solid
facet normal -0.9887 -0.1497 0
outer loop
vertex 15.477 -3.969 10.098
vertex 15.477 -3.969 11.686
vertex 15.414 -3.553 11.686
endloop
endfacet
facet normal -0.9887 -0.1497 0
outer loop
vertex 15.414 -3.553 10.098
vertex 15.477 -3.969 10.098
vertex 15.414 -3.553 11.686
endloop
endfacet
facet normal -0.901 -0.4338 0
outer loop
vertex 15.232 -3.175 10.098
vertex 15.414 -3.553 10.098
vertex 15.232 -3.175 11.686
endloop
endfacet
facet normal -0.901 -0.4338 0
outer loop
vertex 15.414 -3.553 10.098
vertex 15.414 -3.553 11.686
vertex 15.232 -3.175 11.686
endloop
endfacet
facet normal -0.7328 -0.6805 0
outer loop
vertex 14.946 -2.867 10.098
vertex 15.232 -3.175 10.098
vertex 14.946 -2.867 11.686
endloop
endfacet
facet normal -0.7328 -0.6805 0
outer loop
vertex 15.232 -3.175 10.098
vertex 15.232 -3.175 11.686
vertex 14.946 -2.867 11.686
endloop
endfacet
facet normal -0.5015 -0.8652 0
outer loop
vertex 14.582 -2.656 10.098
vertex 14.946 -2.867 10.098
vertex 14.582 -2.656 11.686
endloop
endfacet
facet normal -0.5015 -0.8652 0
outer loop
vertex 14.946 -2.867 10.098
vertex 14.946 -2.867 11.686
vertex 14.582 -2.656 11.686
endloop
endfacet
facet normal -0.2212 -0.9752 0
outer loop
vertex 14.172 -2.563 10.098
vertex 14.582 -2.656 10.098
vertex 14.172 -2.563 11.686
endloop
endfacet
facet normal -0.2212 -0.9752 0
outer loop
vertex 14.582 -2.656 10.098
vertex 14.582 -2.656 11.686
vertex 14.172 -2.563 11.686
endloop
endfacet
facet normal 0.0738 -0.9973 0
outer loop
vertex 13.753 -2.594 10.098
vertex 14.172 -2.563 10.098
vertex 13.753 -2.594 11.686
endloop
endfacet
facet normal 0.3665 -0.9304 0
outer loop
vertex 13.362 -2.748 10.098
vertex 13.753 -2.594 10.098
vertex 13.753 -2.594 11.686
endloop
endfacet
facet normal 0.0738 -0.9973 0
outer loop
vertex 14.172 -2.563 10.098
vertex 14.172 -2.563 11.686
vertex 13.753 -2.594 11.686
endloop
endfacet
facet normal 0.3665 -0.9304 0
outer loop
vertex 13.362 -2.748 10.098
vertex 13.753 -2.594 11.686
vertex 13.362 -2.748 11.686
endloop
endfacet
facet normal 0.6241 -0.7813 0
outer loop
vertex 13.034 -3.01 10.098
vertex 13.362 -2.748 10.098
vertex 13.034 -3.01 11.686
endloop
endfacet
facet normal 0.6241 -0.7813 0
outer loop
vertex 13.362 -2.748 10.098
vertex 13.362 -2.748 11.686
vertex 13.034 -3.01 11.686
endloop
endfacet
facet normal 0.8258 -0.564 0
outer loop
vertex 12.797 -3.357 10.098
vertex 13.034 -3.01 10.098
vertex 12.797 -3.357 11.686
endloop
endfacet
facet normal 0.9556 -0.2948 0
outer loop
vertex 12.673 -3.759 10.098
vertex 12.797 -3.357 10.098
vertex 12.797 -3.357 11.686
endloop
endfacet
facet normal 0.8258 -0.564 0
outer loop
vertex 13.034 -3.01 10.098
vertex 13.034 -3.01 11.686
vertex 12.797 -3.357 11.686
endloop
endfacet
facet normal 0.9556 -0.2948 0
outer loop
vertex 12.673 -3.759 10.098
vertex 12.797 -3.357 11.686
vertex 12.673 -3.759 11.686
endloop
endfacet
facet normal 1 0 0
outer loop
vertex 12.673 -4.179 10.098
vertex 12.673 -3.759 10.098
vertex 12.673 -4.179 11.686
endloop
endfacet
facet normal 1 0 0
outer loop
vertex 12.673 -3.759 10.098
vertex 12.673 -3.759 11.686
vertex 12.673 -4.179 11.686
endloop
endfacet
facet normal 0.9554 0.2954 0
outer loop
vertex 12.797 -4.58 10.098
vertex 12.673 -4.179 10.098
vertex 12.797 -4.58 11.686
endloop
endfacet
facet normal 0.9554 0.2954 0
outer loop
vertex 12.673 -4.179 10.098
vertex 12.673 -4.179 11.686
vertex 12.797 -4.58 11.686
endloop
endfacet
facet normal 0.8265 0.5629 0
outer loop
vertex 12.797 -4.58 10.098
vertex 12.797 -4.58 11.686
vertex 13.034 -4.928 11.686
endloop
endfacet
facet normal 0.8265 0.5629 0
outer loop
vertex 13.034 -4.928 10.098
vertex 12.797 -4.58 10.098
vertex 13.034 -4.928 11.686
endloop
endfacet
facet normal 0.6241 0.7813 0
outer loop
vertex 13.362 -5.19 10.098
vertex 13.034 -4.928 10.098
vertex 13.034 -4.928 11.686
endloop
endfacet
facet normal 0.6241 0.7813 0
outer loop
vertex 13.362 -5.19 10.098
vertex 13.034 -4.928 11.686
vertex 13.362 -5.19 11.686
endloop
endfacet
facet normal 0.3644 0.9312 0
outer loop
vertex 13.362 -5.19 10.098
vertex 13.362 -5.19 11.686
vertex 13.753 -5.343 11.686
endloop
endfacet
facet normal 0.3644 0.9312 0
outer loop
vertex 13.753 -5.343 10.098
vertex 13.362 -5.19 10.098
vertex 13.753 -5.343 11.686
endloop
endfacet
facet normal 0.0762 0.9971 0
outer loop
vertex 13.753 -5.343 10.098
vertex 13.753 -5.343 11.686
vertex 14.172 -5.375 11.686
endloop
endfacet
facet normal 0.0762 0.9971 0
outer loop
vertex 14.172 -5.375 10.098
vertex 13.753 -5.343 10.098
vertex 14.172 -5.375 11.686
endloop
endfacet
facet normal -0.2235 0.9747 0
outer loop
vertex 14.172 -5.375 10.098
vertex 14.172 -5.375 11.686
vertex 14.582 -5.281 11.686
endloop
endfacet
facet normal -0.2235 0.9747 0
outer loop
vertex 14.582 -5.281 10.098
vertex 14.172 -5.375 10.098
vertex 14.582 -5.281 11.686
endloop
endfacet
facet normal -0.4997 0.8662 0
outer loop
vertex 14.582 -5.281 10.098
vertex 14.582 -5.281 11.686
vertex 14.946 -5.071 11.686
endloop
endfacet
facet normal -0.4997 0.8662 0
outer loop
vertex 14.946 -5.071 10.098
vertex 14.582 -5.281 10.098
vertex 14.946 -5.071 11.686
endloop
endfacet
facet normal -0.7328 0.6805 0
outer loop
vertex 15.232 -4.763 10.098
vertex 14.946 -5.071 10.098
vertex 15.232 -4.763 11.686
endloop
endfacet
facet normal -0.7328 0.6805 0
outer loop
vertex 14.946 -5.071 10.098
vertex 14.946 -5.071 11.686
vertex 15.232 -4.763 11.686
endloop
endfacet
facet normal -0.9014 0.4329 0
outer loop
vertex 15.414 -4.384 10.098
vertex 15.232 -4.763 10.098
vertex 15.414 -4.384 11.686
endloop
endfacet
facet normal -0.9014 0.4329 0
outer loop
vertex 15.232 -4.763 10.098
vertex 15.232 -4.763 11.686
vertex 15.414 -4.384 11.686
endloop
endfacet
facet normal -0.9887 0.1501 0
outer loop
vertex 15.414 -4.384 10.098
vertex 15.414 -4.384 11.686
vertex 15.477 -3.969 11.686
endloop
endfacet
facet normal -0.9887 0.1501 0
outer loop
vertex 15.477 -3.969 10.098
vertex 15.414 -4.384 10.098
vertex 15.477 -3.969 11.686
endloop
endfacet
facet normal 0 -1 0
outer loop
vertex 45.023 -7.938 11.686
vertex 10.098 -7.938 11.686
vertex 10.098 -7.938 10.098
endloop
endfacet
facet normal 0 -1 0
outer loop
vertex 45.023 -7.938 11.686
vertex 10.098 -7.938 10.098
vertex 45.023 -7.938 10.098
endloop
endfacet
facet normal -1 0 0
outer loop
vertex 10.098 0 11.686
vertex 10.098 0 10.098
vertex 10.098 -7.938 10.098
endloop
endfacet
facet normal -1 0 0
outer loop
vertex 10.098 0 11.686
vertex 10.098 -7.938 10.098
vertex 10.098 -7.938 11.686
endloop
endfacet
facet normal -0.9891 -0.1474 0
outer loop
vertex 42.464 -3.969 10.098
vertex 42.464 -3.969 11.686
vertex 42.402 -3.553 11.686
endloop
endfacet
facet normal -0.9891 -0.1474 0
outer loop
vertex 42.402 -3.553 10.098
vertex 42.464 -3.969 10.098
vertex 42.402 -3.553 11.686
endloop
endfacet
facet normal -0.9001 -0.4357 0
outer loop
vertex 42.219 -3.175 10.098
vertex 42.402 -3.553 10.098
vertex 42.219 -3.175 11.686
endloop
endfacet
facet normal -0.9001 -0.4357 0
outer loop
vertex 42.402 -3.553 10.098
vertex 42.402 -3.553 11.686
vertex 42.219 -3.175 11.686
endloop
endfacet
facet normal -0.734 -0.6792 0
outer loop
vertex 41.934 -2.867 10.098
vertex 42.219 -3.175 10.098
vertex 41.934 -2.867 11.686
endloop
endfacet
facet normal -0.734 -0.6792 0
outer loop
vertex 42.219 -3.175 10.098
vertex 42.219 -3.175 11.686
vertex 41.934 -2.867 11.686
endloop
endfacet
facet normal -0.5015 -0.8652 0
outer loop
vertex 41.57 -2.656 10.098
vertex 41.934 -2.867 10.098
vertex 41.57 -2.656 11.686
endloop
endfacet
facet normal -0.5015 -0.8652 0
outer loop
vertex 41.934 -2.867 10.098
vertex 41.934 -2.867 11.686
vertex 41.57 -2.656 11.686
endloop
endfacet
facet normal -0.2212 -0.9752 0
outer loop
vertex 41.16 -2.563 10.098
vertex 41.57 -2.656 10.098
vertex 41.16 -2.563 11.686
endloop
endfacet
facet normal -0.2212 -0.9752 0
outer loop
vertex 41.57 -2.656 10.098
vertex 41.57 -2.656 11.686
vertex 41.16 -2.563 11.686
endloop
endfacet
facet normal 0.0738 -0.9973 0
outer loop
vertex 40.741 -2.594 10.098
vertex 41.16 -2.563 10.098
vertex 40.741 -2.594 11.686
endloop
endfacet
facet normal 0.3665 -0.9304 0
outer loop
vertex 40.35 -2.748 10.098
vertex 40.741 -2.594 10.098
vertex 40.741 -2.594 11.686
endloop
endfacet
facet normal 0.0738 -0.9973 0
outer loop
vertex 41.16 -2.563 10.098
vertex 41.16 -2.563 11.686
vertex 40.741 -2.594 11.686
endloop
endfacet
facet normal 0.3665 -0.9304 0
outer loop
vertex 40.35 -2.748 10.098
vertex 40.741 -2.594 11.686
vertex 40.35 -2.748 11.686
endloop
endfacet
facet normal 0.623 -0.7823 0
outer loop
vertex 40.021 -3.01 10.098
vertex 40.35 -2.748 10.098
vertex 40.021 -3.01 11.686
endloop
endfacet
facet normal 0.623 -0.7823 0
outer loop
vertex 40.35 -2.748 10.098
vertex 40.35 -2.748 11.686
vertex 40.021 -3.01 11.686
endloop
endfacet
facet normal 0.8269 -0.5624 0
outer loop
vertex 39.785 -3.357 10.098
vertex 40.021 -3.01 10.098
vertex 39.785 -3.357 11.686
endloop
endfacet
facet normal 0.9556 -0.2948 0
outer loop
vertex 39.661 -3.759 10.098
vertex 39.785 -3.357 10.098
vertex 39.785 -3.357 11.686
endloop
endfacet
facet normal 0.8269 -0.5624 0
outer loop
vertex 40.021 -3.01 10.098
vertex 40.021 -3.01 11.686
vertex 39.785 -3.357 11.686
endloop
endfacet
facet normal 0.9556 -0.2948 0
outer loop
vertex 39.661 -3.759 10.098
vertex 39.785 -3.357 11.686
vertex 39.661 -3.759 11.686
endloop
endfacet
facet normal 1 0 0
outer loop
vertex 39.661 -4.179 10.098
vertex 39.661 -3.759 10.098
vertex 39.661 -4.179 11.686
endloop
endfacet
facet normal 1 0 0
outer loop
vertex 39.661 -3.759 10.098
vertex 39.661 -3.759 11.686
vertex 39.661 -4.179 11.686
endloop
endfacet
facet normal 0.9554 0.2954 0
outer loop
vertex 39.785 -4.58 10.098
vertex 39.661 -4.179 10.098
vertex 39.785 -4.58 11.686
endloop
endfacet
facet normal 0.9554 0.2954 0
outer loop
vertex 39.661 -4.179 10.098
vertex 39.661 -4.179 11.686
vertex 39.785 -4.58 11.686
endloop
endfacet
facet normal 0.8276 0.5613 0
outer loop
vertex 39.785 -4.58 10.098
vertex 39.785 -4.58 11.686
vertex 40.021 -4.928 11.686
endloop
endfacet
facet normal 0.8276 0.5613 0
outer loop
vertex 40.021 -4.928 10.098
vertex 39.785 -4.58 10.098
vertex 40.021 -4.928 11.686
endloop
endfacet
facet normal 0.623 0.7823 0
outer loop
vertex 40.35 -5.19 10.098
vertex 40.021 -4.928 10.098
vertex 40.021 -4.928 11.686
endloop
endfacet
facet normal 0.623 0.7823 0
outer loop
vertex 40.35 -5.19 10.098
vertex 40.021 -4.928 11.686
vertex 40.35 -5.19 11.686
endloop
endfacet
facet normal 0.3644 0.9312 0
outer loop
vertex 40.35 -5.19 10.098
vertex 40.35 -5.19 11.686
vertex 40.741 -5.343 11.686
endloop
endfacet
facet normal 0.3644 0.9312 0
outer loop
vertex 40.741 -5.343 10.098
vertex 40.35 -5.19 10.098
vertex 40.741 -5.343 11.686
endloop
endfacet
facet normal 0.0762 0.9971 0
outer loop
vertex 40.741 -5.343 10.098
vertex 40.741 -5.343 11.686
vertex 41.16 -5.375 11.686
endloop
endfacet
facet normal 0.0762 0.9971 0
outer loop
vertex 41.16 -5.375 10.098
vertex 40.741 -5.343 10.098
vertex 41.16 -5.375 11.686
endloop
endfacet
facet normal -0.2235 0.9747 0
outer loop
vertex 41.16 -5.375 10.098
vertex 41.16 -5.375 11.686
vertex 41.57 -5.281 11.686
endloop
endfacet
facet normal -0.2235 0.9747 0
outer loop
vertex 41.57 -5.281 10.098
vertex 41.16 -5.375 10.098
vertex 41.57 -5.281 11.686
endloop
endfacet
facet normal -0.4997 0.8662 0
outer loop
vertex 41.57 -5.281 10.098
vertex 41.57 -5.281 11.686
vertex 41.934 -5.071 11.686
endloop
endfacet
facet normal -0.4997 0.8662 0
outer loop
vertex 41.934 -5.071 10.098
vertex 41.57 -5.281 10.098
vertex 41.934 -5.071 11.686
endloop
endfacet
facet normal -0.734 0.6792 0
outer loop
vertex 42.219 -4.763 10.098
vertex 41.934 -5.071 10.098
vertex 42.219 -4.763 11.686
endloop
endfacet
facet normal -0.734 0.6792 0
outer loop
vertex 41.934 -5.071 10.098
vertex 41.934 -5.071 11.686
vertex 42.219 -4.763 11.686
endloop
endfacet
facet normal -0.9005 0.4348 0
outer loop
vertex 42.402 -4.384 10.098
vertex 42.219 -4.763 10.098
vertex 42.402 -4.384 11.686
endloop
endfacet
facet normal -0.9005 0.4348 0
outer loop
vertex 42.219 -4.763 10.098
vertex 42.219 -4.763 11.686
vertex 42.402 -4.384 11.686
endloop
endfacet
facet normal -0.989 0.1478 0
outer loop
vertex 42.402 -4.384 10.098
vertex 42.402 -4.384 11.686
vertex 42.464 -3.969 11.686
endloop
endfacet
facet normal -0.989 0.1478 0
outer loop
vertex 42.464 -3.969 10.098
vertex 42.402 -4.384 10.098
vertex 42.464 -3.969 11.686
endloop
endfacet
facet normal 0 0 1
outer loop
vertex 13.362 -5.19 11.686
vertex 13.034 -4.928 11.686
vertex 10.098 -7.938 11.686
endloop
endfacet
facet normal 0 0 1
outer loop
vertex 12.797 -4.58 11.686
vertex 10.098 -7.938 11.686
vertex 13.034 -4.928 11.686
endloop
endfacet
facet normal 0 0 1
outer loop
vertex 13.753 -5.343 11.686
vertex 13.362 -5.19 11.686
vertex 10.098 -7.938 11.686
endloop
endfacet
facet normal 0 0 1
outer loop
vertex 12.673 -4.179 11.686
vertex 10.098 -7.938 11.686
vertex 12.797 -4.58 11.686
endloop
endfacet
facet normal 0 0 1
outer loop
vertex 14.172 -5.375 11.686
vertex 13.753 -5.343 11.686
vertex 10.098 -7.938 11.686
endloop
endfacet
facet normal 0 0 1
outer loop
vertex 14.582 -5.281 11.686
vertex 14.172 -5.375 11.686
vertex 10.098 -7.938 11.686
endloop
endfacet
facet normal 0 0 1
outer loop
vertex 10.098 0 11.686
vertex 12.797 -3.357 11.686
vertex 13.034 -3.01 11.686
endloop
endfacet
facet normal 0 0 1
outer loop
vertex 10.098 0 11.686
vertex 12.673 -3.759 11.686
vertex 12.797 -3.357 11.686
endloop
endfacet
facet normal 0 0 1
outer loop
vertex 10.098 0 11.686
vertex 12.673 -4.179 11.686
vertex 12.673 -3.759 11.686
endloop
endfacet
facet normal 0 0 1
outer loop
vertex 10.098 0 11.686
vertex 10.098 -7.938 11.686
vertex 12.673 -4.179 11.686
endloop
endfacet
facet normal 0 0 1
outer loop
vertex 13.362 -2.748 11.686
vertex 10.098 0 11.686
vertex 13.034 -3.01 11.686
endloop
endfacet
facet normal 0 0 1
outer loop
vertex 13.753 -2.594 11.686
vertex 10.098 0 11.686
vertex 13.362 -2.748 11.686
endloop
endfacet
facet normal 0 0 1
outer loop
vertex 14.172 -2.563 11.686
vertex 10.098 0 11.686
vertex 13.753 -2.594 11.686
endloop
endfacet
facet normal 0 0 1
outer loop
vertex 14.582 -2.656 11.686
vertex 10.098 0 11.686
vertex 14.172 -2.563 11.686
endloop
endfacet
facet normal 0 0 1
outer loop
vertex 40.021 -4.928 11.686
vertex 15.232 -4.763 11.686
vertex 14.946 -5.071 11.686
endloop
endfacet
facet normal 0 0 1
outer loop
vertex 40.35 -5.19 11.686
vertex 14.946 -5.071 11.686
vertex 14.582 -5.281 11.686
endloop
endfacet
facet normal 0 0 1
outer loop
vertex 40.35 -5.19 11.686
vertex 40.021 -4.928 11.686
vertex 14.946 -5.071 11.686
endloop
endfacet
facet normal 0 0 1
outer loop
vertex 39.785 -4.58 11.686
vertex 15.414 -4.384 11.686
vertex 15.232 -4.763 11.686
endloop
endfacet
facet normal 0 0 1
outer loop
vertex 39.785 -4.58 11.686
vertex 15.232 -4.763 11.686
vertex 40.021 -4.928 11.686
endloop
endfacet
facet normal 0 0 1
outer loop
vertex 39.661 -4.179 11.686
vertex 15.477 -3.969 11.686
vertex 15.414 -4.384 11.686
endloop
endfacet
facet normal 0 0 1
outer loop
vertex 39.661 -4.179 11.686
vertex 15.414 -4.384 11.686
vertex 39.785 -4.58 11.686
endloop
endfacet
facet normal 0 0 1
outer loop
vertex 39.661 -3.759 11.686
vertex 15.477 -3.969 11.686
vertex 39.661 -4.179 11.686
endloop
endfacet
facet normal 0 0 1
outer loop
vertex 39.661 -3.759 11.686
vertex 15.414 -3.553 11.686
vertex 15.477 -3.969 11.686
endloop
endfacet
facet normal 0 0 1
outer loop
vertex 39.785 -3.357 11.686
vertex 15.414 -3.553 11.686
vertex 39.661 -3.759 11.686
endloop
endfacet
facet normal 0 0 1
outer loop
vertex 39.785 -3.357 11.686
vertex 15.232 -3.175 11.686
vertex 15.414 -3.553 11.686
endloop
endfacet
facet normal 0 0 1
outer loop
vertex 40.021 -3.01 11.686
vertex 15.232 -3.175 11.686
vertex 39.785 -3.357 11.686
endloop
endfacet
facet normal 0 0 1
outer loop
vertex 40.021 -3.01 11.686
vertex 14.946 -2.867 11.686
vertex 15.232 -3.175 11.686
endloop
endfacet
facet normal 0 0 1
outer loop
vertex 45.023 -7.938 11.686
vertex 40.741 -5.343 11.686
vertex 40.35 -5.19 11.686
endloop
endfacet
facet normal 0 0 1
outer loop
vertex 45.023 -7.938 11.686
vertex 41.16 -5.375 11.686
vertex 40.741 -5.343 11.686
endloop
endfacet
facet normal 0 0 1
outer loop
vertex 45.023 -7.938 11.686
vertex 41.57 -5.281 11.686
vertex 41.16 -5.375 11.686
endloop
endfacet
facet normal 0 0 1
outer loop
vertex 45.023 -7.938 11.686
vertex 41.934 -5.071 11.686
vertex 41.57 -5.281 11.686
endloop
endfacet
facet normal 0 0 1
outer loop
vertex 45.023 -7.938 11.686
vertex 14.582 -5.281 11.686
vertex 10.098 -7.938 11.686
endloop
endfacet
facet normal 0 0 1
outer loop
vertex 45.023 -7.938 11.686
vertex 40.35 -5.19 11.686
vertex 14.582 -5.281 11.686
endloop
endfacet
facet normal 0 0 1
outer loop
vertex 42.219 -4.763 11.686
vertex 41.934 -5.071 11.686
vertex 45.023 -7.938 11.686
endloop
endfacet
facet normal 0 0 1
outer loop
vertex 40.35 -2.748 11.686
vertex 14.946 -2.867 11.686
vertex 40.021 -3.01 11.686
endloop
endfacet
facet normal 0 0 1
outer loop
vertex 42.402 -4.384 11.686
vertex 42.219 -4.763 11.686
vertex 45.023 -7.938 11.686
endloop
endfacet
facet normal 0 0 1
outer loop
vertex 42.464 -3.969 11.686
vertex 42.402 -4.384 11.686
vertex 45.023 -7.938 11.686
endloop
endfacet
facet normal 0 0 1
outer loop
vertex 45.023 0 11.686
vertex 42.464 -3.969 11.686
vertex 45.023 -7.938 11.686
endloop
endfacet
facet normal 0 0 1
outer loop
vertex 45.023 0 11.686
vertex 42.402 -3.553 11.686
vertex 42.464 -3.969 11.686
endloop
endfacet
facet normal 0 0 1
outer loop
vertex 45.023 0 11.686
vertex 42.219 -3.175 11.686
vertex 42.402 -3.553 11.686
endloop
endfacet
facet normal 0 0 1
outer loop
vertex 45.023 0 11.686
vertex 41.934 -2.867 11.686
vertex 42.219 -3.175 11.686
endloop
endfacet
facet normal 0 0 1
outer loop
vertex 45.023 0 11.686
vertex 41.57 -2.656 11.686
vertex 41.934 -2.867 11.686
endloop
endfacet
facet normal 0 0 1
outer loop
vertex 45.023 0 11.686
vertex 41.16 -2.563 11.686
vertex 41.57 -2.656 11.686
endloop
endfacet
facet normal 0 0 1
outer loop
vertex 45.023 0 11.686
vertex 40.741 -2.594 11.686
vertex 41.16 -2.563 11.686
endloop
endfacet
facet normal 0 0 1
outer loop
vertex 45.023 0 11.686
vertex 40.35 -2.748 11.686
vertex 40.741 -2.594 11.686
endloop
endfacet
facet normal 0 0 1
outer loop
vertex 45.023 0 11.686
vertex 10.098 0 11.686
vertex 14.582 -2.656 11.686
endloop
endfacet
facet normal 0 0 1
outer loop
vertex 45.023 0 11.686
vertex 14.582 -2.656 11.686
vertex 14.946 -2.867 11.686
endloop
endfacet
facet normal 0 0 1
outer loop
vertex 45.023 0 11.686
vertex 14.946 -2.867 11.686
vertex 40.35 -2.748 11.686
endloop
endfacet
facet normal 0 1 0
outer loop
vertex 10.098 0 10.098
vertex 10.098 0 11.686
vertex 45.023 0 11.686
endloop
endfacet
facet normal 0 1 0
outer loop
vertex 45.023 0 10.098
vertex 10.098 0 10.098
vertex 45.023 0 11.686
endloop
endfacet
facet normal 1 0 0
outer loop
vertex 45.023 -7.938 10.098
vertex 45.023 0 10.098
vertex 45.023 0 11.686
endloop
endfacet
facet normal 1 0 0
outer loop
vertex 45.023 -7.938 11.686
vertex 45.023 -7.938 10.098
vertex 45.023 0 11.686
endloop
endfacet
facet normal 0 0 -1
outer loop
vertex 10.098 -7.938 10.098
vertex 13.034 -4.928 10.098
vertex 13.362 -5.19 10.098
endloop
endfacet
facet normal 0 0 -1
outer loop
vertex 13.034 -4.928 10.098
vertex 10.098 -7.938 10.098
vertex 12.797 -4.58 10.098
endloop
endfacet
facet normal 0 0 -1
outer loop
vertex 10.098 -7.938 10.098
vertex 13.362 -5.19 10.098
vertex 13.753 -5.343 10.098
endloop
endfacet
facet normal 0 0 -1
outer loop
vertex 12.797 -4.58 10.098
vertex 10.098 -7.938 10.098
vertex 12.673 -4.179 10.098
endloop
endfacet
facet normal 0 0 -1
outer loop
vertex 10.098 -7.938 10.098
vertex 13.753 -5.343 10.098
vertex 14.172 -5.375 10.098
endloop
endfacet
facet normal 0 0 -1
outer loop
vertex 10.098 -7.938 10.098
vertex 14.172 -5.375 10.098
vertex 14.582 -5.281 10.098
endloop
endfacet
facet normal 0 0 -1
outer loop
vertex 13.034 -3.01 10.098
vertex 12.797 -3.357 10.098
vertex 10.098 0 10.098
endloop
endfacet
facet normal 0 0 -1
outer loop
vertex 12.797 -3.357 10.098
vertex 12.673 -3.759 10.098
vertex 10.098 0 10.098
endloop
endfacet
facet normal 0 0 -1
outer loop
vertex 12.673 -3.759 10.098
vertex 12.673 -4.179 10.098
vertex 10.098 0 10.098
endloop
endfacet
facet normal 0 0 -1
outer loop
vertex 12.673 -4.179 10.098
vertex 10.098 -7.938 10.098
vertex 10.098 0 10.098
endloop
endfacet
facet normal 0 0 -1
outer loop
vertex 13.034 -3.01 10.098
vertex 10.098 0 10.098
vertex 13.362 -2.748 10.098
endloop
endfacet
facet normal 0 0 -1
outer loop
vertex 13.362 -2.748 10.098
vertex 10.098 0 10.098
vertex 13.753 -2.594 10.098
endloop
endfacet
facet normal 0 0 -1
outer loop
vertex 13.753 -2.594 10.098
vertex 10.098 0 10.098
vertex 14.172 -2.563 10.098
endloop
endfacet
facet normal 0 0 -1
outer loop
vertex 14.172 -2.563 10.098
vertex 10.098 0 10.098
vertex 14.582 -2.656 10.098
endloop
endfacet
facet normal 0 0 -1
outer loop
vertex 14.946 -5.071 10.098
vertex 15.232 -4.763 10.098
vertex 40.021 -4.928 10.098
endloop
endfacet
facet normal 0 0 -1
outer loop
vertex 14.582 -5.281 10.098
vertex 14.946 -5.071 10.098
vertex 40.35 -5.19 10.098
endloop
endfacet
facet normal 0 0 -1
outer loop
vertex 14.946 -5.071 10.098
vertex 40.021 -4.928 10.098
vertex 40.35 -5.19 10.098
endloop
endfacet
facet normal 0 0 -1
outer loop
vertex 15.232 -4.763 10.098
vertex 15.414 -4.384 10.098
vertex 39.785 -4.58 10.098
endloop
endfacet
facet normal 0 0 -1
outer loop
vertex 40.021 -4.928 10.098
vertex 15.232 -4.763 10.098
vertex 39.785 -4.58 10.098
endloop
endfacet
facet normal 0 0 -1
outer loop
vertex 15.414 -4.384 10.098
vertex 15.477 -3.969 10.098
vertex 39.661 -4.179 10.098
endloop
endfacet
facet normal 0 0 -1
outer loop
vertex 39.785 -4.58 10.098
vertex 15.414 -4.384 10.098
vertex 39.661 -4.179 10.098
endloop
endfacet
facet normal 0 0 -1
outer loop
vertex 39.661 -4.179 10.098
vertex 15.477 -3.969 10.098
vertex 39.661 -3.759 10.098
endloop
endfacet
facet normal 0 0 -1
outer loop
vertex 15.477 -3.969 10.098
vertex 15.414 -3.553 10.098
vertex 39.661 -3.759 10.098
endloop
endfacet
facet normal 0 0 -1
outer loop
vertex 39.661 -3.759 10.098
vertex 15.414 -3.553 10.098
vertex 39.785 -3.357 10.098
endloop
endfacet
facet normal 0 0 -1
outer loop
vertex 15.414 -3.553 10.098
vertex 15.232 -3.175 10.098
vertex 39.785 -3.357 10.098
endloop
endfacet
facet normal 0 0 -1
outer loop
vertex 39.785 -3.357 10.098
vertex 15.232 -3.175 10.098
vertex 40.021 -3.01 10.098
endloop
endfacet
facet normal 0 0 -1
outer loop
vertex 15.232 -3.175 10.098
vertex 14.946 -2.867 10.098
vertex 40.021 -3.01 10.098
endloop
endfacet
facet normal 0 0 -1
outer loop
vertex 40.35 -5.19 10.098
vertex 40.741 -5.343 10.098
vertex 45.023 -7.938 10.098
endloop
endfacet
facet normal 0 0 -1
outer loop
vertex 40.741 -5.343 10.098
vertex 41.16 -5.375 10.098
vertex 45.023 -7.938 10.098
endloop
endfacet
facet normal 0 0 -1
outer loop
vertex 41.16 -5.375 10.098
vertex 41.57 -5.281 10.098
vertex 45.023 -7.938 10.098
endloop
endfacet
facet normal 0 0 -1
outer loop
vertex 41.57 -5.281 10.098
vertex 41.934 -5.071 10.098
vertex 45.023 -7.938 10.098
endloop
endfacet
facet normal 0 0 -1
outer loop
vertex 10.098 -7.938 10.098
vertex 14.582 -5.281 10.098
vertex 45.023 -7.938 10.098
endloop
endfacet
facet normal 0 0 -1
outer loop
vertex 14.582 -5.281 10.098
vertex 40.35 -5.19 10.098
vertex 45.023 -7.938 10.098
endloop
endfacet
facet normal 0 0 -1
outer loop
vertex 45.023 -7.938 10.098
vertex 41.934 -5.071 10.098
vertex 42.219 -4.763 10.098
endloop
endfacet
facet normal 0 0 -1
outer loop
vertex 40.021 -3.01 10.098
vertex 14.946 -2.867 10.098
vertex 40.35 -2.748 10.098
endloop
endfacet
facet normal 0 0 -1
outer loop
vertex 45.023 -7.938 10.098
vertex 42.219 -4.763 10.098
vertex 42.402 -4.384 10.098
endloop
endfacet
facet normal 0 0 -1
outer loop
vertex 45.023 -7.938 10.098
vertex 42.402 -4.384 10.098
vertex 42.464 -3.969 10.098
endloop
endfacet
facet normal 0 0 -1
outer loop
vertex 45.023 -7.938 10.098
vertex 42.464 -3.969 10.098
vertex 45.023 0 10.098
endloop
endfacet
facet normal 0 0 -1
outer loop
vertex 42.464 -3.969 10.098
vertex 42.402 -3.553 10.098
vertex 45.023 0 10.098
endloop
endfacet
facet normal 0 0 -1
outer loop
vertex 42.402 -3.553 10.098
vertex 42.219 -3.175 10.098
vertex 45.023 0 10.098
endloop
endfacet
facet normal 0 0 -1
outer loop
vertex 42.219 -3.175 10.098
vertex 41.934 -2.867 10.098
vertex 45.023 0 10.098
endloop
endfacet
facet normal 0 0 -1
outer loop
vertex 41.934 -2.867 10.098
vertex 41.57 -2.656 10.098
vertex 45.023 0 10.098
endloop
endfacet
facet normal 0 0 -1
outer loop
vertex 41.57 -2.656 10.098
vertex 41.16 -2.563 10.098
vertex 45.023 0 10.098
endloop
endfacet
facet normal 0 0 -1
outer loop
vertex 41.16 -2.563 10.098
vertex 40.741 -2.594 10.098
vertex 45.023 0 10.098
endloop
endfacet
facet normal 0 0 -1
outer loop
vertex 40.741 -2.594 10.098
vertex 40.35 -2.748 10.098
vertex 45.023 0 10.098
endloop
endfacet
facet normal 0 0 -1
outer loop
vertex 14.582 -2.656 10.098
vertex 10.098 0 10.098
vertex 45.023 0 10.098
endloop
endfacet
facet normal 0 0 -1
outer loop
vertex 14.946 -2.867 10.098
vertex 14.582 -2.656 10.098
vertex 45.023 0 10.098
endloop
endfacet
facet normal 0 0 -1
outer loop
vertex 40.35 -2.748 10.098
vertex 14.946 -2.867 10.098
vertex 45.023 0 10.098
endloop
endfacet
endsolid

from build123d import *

# Parameters (mm, degrees)
F0_W     = 34.925
F0_H     = 1.5875
F1_DEPTH = 7.9375
F2_R     = 1.4097
F3_DEPTH = 1.5875


with BuildPart() as f1:
    # F0 (on Front) → F1 (new body)
    with BuildSketch(Plane.XZ):
        with Locations((27.560851, 10.8921)):
            Rectangle(F0_W, F0_H)
    extrude(amount=F1_DEPTH)

    # F2 (on face) → F3 (cut)
    with BuildSketch(Plane.XY.offset(11.68585)):
        with Locations((14.067101, -3.96875)):
            Circle(F2_R)
        with Locations((41.054601, -3.96875)):
            Circle(F2_R)
    extrude(amount=-F3_DEPTH, mode=Mode.SUBTRACT)


solid = f1.part
